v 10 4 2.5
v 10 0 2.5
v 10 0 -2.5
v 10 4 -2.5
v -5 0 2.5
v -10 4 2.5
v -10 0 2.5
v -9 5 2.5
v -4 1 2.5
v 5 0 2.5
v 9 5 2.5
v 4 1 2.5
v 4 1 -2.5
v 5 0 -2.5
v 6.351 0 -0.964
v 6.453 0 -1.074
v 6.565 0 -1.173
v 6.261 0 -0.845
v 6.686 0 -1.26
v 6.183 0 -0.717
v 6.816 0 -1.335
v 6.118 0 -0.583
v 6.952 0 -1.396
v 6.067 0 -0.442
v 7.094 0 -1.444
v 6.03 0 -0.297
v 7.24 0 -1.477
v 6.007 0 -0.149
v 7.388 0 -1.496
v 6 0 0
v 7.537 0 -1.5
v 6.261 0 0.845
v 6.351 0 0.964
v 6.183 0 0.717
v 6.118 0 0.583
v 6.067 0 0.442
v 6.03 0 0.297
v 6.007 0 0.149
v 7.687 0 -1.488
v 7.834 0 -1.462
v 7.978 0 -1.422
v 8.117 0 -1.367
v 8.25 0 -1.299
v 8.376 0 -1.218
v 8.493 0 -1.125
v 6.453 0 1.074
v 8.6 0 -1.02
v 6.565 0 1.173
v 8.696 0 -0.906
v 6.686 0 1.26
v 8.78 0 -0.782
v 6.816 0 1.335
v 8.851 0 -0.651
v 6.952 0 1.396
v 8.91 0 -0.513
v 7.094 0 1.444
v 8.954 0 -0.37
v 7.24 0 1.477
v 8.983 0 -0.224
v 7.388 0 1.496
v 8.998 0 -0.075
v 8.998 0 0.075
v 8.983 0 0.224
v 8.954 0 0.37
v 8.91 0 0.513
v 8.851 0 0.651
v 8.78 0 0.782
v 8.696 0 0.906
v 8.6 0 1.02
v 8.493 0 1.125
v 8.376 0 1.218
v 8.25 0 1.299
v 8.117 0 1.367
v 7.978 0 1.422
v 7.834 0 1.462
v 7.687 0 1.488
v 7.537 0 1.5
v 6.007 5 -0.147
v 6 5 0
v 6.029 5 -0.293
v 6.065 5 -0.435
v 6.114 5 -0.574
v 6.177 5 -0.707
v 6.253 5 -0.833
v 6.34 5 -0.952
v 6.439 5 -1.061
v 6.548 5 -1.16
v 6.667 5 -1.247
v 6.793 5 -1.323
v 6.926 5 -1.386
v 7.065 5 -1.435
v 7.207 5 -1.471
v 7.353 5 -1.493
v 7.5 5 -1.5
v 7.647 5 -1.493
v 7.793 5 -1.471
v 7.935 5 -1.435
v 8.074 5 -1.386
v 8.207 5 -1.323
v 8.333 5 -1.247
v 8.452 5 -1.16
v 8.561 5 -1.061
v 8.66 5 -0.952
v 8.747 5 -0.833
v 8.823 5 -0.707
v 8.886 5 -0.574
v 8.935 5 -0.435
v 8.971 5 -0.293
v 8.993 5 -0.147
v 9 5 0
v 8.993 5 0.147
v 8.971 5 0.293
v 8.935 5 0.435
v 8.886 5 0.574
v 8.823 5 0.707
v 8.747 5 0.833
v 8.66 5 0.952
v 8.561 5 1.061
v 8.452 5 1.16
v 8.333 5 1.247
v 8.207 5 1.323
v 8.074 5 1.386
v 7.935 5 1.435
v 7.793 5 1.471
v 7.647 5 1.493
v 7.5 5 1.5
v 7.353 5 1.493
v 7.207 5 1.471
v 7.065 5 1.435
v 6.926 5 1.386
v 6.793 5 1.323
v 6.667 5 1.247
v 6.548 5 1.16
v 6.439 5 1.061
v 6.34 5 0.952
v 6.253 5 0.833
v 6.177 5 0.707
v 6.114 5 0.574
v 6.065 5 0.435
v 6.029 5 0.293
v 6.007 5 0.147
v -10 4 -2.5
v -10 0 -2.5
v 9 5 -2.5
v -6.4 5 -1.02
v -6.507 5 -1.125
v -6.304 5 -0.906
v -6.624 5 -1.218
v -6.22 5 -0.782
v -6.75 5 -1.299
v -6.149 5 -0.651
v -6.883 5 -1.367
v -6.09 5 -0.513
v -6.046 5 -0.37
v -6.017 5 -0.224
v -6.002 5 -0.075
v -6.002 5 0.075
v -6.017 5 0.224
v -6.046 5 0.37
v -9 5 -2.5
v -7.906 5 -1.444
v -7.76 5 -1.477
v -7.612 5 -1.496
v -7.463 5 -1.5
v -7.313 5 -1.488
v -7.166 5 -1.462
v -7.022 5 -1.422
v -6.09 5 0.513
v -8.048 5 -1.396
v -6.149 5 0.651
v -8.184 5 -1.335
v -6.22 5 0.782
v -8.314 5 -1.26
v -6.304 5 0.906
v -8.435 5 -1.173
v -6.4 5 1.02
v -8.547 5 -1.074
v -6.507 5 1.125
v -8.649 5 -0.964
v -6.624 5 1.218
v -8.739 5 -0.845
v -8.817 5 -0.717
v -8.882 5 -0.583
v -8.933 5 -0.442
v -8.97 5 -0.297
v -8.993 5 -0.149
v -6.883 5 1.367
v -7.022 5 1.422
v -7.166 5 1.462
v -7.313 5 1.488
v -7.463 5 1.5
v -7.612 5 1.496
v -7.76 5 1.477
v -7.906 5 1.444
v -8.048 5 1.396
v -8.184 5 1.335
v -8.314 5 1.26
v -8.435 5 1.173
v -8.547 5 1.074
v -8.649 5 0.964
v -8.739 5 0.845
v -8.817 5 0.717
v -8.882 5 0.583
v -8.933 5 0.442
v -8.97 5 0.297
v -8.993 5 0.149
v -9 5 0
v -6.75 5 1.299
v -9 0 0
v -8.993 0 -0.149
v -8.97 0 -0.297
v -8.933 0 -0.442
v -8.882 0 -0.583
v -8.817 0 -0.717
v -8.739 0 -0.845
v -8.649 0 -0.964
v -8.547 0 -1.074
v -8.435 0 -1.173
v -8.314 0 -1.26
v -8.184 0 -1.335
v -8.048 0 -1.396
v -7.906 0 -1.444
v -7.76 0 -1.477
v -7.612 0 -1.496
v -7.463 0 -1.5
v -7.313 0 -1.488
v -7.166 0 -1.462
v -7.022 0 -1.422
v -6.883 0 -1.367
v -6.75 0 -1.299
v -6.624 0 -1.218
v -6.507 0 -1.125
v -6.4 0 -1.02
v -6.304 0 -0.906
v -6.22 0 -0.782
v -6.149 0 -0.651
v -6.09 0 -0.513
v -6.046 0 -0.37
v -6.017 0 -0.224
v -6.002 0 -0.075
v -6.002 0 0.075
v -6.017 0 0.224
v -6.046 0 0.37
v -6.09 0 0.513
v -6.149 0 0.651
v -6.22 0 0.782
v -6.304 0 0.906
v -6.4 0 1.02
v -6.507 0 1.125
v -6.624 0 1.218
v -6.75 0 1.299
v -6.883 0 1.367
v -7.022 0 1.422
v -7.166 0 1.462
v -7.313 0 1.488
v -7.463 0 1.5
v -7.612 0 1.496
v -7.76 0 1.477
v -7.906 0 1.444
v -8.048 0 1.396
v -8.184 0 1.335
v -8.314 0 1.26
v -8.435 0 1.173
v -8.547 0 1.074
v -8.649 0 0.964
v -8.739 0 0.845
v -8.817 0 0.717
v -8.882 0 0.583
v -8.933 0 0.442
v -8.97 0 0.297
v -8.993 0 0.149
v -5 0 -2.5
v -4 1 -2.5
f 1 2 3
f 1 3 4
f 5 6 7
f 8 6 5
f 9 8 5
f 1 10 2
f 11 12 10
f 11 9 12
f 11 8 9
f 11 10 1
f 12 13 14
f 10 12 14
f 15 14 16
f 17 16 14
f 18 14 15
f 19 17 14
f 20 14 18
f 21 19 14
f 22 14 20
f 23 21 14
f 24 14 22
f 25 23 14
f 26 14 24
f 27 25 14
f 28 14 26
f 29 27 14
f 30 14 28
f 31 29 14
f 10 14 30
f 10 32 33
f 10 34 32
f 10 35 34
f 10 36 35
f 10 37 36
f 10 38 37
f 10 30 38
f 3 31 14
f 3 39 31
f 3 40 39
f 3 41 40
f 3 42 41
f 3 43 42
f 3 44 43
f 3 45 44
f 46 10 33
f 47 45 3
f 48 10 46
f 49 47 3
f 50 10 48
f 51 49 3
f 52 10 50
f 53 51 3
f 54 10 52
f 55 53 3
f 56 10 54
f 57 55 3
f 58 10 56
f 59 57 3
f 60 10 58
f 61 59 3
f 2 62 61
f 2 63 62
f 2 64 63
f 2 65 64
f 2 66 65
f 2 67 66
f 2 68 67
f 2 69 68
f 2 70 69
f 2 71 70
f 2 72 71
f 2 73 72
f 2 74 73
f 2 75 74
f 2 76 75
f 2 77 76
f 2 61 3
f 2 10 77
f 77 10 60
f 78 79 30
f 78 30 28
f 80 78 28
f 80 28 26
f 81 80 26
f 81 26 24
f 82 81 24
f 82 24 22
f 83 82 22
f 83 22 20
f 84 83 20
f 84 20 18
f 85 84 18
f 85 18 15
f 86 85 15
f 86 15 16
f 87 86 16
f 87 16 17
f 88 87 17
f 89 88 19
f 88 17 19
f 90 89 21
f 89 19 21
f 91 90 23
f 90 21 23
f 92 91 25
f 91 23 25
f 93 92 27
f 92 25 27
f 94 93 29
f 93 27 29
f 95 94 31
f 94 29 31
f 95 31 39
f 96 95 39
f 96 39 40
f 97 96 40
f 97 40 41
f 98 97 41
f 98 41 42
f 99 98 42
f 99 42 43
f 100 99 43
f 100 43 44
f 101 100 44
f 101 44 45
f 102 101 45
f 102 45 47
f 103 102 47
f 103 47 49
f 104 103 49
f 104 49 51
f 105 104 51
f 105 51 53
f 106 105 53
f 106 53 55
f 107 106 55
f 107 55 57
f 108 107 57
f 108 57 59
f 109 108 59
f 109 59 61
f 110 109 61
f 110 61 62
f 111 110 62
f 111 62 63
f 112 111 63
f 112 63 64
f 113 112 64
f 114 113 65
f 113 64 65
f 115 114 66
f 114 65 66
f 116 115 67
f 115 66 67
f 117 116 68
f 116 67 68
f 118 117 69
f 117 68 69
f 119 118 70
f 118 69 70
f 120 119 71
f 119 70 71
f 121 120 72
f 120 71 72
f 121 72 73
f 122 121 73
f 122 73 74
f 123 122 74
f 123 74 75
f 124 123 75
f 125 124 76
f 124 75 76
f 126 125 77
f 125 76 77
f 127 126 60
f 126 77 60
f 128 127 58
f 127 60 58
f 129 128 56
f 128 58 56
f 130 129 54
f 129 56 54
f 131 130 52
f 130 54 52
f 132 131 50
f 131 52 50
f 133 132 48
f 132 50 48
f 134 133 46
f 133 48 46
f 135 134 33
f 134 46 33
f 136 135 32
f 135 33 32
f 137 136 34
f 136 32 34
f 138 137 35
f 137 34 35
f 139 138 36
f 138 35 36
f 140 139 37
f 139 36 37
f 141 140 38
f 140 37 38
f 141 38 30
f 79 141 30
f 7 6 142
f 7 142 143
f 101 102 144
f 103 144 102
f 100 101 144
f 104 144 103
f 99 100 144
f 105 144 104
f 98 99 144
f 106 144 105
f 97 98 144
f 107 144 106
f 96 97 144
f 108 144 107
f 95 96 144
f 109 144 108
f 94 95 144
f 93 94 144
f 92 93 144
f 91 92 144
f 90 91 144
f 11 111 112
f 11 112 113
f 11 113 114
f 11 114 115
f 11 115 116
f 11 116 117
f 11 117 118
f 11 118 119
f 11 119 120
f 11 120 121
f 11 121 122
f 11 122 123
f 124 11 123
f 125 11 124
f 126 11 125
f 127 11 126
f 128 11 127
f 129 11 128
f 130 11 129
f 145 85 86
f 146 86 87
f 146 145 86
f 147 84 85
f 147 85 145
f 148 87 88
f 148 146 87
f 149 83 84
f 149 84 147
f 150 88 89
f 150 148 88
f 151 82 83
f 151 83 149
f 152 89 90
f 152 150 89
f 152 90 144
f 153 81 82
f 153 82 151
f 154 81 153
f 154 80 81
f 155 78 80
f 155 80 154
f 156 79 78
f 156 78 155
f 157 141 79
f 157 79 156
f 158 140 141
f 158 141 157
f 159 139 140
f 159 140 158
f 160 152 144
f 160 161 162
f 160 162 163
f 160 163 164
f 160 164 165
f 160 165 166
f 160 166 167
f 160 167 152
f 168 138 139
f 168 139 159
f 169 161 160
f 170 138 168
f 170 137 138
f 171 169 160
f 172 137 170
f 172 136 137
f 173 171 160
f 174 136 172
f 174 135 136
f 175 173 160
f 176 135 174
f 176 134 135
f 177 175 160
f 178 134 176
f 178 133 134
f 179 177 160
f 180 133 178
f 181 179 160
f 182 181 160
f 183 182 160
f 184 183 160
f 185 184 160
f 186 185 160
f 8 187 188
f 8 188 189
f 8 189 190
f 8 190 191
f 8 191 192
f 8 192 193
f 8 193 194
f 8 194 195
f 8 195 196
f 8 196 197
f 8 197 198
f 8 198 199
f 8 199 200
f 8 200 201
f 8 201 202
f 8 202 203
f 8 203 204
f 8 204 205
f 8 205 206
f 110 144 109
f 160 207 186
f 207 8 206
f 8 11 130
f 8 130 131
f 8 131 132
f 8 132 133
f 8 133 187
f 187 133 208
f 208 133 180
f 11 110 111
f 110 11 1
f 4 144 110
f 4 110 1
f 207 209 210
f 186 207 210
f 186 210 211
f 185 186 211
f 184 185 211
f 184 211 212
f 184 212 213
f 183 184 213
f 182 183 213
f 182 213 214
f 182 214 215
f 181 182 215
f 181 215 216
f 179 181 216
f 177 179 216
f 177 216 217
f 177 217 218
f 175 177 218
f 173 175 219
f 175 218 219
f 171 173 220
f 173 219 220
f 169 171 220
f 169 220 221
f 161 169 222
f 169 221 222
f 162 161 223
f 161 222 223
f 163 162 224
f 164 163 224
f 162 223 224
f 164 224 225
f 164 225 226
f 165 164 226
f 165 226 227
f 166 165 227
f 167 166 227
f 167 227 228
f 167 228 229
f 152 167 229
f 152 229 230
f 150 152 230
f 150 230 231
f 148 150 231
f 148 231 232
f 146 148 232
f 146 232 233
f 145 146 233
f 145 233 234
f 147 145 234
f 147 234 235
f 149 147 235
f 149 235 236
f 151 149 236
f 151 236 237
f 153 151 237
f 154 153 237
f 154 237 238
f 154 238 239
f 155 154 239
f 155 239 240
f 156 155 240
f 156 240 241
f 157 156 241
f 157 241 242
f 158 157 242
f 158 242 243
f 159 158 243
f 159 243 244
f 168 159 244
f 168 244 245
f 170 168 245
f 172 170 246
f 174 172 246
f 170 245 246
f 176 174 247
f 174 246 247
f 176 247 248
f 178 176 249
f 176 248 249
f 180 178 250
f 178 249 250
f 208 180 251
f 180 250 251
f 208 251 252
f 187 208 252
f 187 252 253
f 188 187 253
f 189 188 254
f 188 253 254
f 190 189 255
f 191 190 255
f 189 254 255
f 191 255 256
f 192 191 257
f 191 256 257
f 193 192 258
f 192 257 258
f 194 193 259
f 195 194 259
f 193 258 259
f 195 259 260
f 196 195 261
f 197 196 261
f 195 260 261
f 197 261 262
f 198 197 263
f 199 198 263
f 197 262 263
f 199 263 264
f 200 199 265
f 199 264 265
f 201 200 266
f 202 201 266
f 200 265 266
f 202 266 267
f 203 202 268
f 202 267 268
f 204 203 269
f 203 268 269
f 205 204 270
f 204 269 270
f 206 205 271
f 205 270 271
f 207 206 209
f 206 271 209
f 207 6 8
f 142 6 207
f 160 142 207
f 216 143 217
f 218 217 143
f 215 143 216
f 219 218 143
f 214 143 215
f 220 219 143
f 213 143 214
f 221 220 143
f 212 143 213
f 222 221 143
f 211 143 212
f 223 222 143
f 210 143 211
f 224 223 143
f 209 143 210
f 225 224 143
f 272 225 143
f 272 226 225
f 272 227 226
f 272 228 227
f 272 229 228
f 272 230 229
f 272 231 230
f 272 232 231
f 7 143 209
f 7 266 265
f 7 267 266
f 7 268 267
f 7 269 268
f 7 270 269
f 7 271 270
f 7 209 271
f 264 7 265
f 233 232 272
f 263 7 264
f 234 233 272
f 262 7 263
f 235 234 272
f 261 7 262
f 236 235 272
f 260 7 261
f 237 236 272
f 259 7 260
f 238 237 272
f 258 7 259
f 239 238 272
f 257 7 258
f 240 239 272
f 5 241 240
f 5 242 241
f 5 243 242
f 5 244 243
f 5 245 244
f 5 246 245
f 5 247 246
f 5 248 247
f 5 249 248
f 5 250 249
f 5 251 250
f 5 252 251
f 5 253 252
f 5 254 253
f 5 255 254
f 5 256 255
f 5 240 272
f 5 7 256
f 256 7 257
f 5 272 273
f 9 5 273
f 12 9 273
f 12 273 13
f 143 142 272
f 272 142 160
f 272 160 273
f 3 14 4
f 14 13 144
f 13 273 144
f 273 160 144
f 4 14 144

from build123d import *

# Parameters (mm, degrees)
EXTRUDE_1_DEPTH   = 2.5
MM_1_D            = 3
CHAMFER_START     = -3
CHAMFER_1_DEPTH   = 6
CHAMFER_START_2   = -2.5
CHAMFER_1_2_DEPTH = 5


with BuildPart() as part:
    # 草图1 → 凸台-拉伸1 (new, symmetric)
    with BuildSketch(Plane.XY):
        Polygon((5, 0), (10, 0), (10, 5), (-10, 5), (-10, 0), (-5, 0), (-5, 1), (5, 1), align=None)
    extrude(amount=EXTRUDE_1_DEPTH, both=True)

    # 大小mm 暗销孔1 (through all)
    with Locations(Plane(origin=(0, 5, 0), x_dir=(1, 0, 0), z_dir=(0, 1, 0))):
        with Locations((-7.5, 0), (7.5, 0)):
            Hole(MM_1_D / 2)

    # 倒角1: read off the stored shape, not the designer's step
    # 倒角1 outline → 倒角1 (cut)
    with BuildSketch(Plane.XY.offset(CHAMFER_START)):
        Polygon((10, 5), (9, 5), (10, 4), align=None)
        Polygon((-10, 4), (-9, 5), (-10, 5), align=None)
    extrude(amount=CHAMFER_1_DEPTH, mode=Mode.SUBTRACT)

    # Chamfer 1 2 outline → Chamfer 1 2 (add)
    with BuildSketch(Plane.XY.offset(CHAMFER_START_2)):
        Polygon((5, 1), (4, 1), (5, 0), align=None)
        Polygon((-5, 0), (-4, 1), (-5, 1), align=None)
    extrude(amount=CHAMFER_1_2_DEPTH)


solid = part.part
